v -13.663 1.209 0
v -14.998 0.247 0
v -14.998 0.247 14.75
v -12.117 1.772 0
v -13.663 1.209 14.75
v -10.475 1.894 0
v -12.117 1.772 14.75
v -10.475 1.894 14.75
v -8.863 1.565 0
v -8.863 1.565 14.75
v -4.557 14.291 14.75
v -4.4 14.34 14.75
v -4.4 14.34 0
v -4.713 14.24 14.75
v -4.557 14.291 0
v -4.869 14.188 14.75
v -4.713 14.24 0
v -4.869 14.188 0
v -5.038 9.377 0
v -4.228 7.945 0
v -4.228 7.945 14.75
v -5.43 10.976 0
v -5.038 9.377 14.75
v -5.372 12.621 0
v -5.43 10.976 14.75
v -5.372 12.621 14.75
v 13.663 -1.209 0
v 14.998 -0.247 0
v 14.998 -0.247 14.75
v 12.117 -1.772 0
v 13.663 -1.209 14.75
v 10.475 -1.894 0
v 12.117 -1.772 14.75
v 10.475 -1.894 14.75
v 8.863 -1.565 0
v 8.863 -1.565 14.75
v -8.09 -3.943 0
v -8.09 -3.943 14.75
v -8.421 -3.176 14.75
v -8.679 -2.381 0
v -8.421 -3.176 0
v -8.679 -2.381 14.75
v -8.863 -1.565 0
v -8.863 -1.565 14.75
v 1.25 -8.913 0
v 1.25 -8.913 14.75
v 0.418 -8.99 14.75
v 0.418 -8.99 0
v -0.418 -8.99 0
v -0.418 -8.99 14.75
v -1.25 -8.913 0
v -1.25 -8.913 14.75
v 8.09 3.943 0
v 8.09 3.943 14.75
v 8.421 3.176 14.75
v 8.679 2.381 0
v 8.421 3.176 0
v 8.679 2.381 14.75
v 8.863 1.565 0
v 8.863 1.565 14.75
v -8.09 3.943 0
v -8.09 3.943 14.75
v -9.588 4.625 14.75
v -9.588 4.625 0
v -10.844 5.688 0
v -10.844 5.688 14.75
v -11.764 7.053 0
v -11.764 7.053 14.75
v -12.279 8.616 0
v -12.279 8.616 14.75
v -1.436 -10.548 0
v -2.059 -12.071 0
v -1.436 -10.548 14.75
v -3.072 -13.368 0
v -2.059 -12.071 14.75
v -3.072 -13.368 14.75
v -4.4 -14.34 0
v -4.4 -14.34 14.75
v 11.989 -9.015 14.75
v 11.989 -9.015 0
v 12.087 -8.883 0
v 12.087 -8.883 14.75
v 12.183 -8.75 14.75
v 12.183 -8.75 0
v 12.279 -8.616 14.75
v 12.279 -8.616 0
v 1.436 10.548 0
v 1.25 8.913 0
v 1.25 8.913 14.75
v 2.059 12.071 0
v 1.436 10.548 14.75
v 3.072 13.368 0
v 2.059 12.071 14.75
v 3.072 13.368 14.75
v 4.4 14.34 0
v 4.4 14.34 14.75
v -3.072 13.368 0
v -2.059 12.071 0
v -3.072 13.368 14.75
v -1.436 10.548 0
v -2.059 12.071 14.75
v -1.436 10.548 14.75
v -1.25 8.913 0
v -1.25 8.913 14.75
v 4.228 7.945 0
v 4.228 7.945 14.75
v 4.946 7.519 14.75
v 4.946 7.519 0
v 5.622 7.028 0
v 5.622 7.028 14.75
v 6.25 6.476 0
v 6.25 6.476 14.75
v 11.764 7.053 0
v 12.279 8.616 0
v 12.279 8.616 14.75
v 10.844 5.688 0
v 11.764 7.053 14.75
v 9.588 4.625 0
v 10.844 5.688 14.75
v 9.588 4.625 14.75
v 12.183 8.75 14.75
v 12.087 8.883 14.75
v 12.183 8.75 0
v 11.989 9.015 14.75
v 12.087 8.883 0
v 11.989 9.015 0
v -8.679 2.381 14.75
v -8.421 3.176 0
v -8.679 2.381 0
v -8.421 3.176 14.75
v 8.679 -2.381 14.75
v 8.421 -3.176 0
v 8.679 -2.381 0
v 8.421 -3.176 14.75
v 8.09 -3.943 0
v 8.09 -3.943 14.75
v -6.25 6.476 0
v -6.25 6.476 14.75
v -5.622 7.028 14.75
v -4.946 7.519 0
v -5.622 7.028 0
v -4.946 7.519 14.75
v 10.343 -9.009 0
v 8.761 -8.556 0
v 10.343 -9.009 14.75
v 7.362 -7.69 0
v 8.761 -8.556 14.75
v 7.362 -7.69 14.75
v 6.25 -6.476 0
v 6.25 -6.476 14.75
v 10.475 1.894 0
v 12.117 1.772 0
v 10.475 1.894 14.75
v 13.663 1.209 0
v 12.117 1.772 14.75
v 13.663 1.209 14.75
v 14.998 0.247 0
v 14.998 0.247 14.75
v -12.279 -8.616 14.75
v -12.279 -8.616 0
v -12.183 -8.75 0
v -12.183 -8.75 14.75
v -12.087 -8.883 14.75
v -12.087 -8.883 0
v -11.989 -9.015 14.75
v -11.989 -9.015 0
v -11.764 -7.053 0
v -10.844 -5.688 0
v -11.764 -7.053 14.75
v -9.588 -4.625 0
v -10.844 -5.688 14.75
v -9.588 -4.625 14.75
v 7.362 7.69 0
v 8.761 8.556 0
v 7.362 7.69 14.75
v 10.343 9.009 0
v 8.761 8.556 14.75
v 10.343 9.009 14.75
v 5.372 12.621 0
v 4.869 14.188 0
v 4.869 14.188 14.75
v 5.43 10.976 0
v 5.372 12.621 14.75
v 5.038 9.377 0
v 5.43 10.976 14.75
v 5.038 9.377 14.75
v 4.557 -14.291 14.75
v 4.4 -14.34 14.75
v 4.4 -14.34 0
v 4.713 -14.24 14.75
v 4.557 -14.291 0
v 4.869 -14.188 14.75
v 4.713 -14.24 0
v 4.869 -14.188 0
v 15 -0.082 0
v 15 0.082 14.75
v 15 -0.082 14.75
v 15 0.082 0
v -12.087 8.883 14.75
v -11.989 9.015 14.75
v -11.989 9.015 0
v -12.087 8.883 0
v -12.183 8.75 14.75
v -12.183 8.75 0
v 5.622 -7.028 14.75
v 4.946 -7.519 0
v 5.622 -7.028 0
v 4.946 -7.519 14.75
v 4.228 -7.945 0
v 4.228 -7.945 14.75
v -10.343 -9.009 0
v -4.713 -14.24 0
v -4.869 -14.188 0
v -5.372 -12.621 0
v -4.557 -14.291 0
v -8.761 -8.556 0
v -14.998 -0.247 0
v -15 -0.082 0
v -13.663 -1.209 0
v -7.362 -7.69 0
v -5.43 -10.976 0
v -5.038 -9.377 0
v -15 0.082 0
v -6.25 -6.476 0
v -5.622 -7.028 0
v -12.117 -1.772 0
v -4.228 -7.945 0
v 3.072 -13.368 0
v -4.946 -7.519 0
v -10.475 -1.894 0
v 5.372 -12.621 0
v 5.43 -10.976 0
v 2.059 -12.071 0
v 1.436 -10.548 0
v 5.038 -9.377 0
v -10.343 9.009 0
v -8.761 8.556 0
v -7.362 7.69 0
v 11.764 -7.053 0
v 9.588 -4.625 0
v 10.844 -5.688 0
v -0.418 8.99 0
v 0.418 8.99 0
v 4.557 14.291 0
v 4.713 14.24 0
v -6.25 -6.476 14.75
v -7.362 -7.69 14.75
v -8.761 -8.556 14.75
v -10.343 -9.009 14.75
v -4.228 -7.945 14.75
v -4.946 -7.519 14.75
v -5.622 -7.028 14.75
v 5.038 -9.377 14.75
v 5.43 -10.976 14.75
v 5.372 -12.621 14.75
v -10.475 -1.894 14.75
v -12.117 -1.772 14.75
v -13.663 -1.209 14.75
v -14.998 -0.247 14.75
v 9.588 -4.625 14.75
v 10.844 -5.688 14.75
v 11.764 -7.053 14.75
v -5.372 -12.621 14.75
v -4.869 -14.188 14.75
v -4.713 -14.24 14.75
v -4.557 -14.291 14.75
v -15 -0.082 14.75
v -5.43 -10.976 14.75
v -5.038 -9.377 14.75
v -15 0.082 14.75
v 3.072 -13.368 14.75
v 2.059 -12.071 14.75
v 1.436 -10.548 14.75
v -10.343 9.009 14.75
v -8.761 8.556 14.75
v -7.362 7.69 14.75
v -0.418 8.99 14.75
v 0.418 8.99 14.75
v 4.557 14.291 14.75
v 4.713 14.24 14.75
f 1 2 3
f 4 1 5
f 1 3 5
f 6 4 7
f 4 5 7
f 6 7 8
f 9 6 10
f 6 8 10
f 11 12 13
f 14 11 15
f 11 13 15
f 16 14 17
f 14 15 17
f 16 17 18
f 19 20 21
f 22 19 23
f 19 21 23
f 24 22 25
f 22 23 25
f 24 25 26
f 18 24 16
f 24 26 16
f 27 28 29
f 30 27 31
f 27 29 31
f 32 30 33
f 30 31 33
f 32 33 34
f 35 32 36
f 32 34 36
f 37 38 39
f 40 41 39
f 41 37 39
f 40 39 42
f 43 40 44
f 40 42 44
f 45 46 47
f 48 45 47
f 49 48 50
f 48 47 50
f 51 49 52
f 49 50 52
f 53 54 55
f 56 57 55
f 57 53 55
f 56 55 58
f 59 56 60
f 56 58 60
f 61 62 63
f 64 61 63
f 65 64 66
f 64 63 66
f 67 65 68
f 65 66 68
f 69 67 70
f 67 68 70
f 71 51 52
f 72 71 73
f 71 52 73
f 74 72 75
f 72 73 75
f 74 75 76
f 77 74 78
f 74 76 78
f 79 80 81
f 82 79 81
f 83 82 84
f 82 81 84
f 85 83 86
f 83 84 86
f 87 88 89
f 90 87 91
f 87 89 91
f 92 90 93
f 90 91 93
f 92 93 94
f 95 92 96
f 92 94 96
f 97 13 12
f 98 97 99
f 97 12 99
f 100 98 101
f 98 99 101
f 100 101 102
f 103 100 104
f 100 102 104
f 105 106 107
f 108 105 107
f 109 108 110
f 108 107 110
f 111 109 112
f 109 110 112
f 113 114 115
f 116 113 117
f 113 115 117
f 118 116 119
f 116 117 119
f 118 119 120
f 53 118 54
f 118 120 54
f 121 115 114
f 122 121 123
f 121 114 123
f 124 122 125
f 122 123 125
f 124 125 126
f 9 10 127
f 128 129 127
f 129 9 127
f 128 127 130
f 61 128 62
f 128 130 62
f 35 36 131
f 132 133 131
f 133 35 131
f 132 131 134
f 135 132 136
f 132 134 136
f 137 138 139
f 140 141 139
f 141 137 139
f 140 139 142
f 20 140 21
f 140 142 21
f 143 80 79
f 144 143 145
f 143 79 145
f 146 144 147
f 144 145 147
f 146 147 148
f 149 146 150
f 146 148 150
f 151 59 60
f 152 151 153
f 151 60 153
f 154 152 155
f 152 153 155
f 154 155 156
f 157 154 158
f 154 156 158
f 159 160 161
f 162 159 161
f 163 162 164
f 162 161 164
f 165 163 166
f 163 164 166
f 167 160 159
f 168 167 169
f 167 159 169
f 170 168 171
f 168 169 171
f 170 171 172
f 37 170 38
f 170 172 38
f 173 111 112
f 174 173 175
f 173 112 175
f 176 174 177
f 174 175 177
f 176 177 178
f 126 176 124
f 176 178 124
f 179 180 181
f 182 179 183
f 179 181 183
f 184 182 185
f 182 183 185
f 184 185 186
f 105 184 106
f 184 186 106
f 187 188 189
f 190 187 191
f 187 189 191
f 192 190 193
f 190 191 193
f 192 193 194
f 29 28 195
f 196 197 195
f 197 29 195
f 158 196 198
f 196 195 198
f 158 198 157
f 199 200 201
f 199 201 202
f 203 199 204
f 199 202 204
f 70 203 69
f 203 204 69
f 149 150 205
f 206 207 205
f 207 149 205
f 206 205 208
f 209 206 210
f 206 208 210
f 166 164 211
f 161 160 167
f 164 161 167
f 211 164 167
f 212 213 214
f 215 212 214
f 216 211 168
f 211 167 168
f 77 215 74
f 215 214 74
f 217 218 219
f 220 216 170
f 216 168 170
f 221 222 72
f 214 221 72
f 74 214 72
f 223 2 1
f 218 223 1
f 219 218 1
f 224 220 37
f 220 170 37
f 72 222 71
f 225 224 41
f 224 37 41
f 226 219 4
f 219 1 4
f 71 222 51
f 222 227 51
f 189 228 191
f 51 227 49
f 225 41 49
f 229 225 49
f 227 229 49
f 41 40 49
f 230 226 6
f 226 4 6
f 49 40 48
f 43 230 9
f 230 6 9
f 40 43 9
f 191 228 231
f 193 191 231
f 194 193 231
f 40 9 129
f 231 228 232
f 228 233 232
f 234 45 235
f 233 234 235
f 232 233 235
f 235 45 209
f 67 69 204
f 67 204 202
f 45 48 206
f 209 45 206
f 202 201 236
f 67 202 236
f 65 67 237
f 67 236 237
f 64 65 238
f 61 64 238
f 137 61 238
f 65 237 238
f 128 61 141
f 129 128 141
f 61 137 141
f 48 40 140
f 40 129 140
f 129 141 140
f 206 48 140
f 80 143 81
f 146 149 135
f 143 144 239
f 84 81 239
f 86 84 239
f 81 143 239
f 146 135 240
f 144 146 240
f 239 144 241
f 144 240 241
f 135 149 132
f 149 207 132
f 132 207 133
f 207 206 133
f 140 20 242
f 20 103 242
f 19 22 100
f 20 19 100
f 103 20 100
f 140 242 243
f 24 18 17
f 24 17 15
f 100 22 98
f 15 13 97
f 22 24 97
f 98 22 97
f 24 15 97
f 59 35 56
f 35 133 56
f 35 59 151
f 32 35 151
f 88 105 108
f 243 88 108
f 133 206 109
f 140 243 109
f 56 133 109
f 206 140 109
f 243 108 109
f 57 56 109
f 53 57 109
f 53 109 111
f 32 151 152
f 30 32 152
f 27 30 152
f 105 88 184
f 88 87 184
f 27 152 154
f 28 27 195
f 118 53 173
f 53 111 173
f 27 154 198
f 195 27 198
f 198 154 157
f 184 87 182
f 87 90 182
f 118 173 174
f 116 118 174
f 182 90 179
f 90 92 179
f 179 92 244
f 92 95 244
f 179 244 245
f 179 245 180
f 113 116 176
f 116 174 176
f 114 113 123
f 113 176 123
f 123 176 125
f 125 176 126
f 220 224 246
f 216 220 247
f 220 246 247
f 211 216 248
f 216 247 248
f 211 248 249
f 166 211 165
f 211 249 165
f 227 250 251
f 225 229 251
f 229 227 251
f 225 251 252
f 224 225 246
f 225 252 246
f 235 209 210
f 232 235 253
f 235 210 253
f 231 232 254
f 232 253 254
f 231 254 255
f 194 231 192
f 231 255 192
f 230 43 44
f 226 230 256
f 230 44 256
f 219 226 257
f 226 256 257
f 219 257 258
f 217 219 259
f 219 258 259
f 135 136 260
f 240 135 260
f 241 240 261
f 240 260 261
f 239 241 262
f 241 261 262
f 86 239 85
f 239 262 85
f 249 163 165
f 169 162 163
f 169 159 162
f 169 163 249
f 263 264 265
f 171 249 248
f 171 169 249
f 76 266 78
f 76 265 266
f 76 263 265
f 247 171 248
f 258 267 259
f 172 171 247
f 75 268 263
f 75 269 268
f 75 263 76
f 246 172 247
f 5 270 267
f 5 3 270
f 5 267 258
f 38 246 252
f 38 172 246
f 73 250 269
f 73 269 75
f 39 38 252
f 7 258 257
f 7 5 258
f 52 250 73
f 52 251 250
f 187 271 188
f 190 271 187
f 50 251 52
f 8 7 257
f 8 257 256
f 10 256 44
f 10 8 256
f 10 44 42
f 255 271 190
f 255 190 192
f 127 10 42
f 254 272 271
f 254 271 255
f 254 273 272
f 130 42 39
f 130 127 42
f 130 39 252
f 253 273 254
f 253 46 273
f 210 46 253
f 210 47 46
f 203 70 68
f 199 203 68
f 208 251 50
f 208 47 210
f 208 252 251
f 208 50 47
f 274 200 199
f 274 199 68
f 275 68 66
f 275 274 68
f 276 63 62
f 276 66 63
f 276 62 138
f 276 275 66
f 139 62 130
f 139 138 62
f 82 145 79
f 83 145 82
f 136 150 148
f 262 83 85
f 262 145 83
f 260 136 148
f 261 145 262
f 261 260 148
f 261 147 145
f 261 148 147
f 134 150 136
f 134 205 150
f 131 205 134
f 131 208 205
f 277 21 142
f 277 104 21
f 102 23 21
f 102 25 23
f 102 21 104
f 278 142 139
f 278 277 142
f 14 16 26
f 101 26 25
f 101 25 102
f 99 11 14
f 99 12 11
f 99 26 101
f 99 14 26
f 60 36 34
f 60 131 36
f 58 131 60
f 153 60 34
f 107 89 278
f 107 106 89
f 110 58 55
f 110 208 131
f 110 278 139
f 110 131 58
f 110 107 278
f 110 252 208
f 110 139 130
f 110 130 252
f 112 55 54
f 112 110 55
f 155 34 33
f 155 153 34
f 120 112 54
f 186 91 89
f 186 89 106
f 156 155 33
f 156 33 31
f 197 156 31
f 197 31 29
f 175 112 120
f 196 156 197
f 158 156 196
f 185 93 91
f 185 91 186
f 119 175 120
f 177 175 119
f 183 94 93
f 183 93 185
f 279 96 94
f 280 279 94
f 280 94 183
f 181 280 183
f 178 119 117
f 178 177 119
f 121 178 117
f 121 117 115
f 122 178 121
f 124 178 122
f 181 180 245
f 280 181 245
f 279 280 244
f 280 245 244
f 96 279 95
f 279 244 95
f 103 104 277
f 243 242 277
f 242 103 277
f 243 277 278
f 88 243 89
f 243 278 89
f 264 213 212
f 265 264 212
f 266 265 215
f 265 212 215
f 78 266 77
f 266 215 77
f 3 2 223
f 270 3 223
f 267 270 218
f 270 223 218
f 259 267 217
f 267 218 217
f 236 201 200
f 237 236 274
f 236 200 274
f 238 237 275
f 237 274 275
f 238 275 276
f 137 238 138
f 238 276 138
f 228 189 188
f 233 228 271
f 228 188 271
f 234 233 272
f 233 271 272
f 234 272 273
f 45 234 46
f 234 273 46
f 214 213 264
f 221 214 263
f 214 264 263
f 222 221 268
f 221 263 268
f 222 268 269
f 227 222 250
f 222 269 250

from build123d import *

# Parameters (mm, degrees)
SKETCH1_R           = 15
BOSS_EXTRUDE1_DEPTH = 14.75
CUT_EXTRUDE1_DEPTH  = 15.75
CIRPATTERN1_COUNT   = 10


with BuildPart() as part:
    # Sketch1 → Boss-Extrude1 (new body)
    with BuildSketch(Plane.XY):
        Circle(SKETCH1_R)
    extrude(amount=BOSS_EXTRUDE1_DEPTH)

    # Sketch2 → Cut-Extrude1 (cut, through all)
    with BuildSketch(Plane.XY.offset(14.75)):
        with BuildLine():
            ThreePointArc((-1.25, 8.912771735), (0, 9), (1.25, 8.912771735))
            ThreePointArc((1.25, 8.912771735), (2.05890341, 12.07109765), (4.4, 14.340153416))
            ThreePointArc((4.4, 14.340153416), (0, 15), (-4.4, 14.340153416))
            ThreePointArc((-4.4, 14.340153416), (-2.05890341, 12.07109765), (-1.25, 8.912771735))
        make_face()
    cut_extrude1 = extrude(amount=-CUT_EXTRUDE1_DEPTH, mode=Mode.SUBTRACT)

    # CirPattern1: Cut-Extrude1 ×10 about axis
    cirpattern1_axis = Axis((0, 0, 0), (0, 0, 1))
    for i in range(1, CIRPATTERN1_COUNT):
        add(cut_extrude1.rotate(cirpattern1_axis, i * 360 / CIRPATTERN1_COUNT), mode=Mode.SUBTRACT)


solid = part.part
